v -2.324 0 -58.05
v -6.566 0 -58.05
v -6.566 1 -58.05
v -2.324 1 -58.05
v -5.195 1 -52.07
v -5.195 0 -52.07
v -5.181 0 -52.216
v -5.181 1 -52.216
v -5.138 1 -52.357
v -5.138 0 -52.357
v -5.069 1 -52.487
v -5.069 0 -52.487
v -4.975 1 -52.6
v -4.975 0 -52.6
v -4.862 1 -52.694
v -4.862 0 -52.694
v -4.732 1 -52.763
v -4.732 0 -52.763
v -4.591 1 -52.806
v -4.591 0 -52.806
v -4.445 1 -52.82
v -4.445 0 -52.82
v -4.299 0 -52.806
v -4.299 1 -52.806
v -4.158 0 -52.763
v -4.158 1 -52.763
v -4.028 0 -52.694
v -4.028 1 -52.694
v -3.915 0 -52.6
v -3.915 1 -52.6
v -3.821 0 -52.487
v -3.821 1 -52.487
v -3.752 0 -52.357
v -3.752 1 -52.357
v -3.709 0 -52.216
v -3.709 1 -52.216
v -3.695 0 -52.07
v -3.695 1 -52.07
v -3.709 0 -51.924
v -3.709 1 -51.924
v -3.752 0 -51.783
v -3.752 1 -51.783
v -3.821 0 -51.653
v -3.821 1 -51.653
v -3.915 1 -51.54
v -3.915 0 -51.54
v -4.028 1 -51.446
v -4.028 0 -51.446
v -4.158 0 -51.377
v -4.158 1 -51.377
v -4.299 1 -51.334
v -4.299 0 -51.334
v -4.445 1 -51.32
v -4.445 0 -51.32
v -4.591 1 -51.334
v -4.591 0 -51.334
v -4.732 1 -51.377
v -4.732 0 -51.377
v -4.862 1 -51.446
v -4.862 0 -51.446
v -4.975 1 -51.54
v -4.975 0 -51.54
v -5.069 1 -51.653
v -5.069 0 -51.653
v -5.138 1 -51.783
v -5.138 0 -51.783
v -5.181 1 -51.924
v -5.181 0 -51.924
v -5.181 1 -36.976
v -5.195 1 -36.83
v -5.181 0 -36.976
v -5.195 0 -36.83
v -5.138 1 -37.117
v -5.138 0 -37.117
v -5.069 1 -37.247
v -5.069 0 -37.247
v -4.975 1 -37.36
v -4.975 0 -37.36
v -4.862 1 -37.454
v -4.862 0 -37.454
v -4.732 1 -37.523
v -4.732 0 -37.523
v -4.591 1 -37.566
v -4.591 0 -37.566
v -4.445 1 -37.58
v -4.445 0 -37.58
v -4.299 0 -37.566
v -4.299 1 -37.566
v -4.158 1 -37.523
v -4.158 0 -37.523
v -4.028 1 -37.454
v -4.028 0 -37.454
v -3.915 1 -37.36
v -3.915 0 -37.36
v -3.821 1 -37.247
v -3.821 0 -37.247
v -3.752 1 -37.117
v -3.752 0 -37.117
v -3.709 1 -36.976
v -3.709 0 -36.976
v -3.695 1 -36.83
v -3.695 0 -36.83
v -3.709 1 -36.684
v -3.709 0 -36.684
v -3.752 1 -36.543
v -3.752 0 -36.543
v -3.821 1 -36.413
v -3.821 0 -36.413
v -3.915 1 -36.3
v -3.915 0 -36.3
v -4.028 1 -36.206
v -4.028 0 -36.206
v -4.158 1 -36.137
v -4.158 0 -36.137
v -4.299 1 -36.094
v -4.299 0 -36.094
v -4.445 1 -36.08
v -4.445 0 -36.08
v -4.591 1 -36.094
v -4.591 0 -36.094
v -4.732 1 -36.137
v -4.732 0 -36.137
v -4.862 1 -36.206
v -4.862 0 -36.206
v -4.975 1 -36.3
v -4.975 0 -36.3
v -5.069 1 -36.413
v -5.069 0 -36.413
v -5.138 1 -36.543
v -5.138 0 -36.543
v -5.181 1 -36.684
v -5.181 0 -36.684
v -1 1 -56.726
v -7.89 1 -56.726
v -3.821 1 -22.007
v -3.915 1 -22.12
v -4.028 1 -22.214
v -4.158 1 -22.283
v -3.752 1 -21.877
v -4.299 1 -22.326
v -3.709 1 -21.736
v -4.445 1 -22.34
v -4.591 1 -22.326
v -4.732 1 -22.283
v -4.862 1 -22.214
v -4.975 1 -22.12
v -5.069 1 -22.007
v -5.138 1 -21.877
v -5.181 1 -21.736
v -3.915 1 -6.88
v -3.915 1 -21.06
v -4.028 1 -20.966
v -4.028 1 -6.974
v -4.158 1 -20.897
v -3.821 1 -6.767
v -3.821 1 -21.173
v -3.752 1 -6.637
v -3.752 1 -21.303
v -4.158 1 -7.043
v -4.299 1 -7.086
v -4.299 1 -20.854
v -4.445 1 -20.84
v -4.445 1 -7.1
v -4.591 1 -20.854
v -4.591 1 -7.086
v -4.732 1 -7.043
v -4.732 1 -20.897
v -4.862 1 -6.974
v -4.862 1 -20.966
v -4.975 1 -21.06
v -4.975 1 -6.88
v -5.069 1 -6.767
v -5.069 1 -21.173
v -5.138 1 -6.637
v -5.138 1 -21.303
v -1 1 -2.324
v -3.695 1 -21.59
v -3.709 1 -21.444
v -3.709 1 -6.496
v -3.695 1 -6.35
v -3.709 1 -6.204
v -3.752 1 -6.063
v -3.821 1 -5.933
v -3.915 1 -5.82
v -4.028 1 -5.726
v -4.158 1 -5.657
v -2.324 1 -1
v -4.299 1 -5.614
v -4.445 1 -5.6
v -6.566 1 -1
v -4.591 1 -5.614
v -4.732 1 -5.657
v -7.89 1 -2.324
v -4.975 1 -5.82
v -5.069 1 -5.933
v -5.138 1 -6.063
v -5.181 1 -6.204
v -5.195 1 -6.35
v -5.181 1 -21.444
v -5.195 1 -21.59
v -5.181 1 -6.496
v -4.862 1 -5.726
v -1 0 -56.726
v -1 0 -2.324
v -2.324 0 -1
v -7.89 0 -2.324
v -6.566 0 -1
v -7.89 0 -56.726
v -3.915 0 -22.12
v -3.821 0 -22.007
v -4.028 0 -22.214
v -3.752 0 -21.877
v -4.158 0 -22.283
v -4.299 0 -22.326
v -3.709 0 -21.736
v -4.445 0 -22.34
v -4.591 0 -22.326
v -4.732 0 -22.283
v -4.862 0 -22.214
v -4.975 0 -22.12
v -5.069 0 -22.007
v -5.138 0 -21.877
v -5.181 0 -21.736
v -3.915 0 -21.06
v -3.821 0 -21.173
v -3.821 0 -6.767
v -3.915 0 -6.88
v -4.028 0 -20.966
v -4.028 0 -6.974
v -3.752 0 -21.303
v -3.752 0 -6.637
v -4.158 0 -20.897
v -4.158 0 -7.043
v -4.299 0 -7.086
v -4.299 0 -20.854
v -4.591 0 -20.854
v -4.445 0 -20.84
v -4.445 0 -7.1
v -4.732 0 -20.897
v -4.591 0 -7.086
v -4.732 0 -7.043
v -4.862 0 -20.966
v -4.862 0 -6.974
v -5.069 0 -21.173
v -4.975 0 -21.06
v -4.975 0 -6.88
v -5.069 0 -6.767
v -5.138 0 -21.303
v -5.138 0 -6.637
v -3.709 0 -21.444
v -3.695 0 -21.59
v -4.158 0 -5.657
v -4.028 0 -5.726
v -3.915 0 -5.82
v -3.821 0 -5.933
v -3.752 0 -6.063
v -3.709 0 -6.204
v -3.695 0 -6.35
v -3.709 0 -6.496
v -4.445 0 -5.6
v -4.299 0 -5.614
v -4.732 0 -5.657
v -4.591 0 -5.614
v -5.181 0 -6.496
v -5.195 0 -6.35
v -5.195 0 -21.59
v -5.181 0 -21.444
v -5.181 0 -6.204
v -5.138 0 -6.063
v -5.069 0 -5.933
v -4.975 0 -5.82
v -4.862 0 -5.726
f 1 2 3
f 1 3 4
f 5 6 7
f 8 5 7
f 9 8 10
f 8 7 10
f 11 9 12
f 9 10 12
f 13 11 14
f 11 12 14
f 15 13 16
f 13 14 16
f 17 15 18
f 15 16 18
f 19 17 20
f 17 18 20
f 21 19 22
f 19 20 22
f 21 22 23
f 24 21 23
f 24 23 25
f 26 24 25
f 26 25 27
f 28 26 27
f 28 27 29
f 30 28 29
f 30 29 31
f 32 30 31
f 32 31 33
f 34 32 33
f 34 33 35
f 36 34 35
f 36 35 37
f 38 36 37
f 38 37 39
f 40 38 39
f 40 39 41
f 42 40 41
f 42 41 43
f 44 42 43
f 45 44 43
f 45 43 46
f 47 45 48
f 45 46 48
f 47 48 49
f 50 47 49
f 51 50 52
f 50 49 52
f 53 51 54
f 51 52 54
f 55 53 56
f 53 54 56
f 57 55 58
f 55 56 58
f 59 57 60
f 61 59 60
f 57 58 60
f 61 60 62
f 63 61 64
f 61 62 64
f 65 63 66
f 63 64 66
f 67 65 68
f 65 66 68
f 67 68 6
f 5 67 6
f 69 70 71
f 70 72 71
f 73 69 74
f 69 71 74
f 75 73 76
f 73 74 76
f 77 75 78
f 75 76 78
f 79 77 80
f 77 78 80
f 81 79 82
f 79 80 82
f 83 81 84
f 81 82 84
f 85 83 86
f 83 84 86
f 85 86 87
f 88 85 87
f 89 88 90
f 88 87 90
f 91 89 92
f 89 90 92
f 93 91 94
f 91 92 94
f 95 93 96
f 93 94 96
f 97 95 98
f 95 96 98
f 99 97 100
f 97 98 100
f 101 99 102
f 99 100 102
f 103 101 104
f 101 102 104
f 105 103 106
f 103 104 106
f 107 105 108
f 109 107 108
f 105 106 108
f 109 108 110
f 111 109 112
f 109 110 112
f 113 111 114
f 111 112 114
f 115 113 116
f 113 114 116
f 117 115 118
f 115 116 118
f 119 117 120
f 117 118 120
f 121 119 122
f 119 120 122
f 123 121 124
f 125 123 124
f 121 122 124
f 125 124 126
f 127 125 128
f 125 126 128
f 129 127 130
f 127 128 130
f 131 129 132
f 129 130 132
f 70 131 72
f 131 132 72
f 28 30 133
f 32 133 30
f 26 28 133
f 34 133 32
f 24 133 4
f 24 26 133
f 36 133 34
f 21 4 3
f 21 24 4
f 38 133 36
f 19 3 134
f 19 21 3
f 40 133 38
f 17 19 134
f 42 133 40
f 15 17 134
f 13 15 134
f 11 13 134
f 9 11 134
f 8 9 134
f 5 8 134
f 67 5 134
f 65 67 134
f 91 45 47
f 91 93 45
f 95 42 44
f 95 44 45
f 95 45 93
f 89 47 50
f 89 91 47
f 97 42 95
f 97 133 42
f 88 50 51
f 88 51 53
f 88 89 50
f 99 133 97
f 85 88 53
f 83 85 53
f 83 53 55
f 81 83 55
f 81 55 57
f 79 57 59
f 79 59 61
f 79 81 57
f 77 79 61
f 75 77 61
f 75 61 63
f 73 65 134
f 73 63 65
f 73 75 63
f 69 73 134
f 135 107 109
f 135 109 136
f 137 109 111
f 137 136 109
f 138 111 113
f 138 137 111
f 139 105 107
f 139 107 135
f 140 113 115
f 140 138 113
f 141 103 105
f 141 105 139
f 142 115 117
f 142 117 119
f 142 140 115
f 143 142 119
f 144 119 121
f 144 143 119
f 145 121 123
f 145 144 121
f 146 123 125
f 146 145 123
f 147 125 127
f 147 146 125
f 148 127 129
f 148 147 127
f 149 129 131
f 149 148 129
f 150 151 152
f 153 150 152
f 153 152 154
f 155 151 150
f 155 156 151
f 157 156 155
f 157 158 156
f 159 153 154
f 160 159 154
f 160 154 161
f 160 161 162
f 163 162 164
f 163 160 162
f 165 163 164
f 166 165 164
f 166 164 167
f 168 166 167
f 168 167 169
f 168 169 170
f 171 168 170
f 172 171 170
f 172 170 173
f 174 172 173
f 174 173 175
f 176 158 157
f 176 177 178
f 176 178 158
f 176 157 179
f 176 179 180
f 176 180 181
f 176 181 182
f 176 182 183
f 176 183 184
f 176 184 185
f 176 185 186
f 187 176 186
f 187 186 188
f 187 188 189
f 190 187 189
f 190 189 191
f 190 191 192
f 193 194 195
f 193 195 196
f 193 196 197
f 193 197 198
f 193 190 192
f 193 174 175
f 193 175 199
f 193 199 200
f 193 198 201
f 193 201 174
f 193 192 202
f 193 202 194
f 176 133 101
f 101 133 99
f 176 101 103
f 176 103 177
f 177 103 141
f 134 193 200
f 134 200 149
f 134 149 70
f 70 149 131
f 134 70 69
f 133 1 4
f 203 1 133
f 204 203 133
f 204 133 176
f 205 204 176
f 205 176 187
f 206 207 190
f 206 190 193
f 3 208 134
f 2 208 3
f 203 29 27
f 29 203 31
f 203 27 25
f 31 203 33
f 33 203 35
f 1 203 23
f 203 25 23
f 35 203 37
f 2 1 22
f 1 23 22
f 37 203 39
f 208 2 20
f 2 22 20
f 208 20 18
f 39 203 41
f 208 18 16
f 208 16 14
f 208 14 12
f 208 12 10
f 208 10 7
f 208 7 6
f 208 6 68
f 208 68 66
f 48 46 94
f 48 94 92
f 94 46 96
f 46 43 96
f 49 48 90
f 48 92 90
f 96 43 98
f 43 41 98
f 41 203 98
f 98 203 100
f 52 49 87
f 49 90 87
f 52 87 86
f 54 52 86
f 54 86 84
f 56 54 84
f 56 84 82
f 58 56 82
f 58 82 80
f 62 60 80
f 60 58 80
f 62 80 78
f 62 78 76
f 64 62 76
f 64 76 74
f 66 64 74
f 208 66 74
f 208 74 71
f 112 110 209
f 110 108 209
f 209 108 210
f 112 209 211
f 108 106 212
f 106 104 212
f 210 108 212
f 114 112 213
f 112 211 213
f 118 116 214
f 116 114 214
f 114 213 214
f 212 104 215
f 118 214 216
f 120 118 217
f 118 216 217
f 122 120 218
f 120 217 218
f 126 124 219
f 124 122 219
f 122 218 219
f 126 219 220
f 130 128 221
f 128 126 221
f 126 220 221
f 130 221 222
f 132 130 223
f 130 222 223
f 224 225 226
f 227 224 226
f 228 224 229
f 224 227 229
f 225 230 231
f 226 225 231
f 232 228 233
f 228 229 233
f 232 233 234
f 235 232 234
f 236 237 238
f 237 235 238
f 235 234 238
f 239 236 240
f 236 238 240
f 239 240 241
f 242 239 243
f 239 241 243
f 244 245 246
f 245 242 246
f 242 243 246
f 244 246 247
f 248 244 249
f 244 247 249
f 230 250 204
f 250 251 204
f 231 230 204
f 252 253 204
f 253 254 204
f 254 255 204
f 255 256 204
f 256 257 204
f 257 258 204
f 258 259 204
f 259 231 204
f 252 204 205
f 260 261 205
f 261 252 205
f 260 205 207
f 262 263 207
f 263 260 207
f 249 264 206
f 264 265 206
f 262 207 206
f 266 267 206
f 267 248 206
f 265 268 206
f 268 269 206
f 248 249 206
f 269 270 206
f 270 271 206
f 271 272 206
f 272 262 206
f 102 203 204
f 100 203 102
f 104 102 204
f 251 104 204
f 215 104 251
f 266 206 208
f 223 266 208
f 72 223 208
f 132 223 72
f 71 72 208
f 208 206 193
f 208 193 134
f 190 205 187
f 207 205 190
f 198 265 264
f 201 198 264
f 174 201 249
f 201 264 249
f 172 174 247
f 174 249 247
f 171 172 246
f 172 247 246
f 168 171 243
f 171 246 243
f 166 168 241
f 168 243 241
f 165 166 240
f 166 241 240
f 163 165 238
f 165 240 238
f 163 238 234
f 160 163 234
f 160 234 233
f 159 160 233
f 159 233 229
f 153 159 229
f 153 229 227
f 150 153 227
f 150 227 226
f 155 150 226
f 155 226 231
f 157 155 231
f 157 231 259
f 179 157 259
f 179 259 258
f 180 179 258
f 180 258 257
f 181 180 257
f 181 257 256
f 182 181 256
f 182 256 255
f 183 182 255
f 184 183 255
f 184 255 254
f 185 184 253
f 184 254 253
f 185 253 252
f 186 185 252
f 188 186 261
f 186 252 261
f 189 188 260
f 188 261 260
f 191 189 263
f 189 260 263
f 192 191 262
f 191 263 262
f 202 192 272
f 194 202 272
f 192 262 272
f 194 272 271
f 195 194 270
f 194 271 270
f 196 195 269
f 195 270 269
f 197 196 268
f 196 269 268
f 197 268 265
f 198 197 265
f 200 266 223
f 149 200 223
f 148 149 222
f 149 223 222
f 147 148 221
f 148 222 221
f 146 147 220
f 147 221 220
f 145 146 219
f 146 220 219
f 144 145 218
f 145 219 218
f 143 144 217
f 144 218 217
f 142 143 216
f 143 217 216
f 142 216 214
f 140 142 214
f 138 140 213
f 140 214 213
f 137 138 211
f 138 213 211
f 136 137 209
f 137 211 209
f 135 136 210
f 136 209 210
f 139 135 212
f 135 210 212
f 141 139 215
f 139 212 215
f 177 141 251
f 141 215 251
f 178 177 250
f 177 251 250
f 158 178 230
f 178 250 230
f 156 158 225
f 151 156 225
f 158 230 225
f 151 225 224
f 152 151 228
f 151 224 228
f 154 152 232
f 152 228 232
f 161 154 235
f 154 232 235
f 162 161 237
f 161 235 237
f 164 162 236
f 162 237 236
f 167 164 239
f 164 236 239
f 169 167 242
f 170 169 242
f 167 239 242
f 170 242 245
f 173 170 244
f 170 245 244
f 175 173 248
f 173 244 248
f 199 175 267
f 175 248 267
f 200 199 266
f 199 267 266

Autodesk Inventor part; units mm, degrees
ref_plane "YZ Plane" through (0, 0, 0) normal (1, 0, 0) x (0, 1, 0)
ref_plane "XZ Plane" through (0, 0, 0) normal (0, 1, 0) x (-1, 0, 0)
ref_plane "XY Plane" through (0, 0, 0) normal (0, 0, 1) x (1, 0, 0)
sketch "Szkic1" plane through (0, 0, 0) normal (0, 1, 0) x (-1, 0, 0)
  line L0 (8.89, -1.91) -> (8.89, -57.14)
  line L1 (6.98, -59.05) -> (1.91, -59.05)
  line L2 (0, -57.14) -> (0, -1.91)
  line L3 (6.98, 0) -> (8.89, -1.91)
  line L4 (1.91, 0) -> (0, -1.91)
  line L5 (0, -57.14) -> (1.91, -59.05)
  line L6 (6.98, -59.05) -> (8.89, -57.14)
  line L7 (6.98, 0) -> (1.91, 0)
  line L8 (4.445, -59.05) -> (4.445, 0)
  circle A0 centre (4.445, -6.35) radius 0.75
  circle A1 centre (4.445, -21.59) radius 0.75
  circle A2 centre (4.445, -36.83) radius 0.75
  circle A3 centre (4.445, -52.07) radius 0.75
  line L9 (7.89, -56.7258) -> (6.5658, -58.05)
  line L10 (6.5658, -58.05) -> (2.3242, -58.05)
  line L11 (2.3242, -58.05) -> (1, -56.7258)
  line L12 (1, -56.7258) -> (1, -2.3242)
  line L13 (1, -2.3242) -> (2.3242, -1)
  line L14 (2.3242, -1) -> (6.5658, -1)
  line L15 (6.5658, -1) -> (7.89, -2.3242)
  line L16 (7.89, -2.3242) -> (7.89, -56.7258)
  point P0 (0, 0)
  point P1 (8.89, -59.05)
  point P2 (8.89, 0)
  point P3 (0, -59.05)
  dimension "d0" = 8.89
  dimension "d2" = 1.91
  dimension "d3" = 1.91
  dimension "d4" = 1.91
  dimension "d5" = 1.91
  dimension "d6" = 1.91
  dimension "d7" = 1.91
  dimension "d8" = 1.91
  dimension "d9" = 1.91
  dimension "d10" = 1.5
  dimension "d11" = 6.35
  dimension "d14" = 15.24
  dimension "d19" = 1
extrude "Wyciągnięcie proste1" add sketch "Szkic1" along normal blind 1 contours L14 L15 L16 L9 L10 L8 A3 A2 A1 A0 | L8 A0 A1 A2 A3 L10 L11 L12 L13 L14
equation "\"d3\" = d2"
equation "\"d4\" = d2"
equation "\"d5\" = d4"
equation "\"d6\" = d2"
equation "\"d7\" = d6"
equation "\"d8\" = d2"
equation "\"d9\" = d8"
properties part number "vin"
